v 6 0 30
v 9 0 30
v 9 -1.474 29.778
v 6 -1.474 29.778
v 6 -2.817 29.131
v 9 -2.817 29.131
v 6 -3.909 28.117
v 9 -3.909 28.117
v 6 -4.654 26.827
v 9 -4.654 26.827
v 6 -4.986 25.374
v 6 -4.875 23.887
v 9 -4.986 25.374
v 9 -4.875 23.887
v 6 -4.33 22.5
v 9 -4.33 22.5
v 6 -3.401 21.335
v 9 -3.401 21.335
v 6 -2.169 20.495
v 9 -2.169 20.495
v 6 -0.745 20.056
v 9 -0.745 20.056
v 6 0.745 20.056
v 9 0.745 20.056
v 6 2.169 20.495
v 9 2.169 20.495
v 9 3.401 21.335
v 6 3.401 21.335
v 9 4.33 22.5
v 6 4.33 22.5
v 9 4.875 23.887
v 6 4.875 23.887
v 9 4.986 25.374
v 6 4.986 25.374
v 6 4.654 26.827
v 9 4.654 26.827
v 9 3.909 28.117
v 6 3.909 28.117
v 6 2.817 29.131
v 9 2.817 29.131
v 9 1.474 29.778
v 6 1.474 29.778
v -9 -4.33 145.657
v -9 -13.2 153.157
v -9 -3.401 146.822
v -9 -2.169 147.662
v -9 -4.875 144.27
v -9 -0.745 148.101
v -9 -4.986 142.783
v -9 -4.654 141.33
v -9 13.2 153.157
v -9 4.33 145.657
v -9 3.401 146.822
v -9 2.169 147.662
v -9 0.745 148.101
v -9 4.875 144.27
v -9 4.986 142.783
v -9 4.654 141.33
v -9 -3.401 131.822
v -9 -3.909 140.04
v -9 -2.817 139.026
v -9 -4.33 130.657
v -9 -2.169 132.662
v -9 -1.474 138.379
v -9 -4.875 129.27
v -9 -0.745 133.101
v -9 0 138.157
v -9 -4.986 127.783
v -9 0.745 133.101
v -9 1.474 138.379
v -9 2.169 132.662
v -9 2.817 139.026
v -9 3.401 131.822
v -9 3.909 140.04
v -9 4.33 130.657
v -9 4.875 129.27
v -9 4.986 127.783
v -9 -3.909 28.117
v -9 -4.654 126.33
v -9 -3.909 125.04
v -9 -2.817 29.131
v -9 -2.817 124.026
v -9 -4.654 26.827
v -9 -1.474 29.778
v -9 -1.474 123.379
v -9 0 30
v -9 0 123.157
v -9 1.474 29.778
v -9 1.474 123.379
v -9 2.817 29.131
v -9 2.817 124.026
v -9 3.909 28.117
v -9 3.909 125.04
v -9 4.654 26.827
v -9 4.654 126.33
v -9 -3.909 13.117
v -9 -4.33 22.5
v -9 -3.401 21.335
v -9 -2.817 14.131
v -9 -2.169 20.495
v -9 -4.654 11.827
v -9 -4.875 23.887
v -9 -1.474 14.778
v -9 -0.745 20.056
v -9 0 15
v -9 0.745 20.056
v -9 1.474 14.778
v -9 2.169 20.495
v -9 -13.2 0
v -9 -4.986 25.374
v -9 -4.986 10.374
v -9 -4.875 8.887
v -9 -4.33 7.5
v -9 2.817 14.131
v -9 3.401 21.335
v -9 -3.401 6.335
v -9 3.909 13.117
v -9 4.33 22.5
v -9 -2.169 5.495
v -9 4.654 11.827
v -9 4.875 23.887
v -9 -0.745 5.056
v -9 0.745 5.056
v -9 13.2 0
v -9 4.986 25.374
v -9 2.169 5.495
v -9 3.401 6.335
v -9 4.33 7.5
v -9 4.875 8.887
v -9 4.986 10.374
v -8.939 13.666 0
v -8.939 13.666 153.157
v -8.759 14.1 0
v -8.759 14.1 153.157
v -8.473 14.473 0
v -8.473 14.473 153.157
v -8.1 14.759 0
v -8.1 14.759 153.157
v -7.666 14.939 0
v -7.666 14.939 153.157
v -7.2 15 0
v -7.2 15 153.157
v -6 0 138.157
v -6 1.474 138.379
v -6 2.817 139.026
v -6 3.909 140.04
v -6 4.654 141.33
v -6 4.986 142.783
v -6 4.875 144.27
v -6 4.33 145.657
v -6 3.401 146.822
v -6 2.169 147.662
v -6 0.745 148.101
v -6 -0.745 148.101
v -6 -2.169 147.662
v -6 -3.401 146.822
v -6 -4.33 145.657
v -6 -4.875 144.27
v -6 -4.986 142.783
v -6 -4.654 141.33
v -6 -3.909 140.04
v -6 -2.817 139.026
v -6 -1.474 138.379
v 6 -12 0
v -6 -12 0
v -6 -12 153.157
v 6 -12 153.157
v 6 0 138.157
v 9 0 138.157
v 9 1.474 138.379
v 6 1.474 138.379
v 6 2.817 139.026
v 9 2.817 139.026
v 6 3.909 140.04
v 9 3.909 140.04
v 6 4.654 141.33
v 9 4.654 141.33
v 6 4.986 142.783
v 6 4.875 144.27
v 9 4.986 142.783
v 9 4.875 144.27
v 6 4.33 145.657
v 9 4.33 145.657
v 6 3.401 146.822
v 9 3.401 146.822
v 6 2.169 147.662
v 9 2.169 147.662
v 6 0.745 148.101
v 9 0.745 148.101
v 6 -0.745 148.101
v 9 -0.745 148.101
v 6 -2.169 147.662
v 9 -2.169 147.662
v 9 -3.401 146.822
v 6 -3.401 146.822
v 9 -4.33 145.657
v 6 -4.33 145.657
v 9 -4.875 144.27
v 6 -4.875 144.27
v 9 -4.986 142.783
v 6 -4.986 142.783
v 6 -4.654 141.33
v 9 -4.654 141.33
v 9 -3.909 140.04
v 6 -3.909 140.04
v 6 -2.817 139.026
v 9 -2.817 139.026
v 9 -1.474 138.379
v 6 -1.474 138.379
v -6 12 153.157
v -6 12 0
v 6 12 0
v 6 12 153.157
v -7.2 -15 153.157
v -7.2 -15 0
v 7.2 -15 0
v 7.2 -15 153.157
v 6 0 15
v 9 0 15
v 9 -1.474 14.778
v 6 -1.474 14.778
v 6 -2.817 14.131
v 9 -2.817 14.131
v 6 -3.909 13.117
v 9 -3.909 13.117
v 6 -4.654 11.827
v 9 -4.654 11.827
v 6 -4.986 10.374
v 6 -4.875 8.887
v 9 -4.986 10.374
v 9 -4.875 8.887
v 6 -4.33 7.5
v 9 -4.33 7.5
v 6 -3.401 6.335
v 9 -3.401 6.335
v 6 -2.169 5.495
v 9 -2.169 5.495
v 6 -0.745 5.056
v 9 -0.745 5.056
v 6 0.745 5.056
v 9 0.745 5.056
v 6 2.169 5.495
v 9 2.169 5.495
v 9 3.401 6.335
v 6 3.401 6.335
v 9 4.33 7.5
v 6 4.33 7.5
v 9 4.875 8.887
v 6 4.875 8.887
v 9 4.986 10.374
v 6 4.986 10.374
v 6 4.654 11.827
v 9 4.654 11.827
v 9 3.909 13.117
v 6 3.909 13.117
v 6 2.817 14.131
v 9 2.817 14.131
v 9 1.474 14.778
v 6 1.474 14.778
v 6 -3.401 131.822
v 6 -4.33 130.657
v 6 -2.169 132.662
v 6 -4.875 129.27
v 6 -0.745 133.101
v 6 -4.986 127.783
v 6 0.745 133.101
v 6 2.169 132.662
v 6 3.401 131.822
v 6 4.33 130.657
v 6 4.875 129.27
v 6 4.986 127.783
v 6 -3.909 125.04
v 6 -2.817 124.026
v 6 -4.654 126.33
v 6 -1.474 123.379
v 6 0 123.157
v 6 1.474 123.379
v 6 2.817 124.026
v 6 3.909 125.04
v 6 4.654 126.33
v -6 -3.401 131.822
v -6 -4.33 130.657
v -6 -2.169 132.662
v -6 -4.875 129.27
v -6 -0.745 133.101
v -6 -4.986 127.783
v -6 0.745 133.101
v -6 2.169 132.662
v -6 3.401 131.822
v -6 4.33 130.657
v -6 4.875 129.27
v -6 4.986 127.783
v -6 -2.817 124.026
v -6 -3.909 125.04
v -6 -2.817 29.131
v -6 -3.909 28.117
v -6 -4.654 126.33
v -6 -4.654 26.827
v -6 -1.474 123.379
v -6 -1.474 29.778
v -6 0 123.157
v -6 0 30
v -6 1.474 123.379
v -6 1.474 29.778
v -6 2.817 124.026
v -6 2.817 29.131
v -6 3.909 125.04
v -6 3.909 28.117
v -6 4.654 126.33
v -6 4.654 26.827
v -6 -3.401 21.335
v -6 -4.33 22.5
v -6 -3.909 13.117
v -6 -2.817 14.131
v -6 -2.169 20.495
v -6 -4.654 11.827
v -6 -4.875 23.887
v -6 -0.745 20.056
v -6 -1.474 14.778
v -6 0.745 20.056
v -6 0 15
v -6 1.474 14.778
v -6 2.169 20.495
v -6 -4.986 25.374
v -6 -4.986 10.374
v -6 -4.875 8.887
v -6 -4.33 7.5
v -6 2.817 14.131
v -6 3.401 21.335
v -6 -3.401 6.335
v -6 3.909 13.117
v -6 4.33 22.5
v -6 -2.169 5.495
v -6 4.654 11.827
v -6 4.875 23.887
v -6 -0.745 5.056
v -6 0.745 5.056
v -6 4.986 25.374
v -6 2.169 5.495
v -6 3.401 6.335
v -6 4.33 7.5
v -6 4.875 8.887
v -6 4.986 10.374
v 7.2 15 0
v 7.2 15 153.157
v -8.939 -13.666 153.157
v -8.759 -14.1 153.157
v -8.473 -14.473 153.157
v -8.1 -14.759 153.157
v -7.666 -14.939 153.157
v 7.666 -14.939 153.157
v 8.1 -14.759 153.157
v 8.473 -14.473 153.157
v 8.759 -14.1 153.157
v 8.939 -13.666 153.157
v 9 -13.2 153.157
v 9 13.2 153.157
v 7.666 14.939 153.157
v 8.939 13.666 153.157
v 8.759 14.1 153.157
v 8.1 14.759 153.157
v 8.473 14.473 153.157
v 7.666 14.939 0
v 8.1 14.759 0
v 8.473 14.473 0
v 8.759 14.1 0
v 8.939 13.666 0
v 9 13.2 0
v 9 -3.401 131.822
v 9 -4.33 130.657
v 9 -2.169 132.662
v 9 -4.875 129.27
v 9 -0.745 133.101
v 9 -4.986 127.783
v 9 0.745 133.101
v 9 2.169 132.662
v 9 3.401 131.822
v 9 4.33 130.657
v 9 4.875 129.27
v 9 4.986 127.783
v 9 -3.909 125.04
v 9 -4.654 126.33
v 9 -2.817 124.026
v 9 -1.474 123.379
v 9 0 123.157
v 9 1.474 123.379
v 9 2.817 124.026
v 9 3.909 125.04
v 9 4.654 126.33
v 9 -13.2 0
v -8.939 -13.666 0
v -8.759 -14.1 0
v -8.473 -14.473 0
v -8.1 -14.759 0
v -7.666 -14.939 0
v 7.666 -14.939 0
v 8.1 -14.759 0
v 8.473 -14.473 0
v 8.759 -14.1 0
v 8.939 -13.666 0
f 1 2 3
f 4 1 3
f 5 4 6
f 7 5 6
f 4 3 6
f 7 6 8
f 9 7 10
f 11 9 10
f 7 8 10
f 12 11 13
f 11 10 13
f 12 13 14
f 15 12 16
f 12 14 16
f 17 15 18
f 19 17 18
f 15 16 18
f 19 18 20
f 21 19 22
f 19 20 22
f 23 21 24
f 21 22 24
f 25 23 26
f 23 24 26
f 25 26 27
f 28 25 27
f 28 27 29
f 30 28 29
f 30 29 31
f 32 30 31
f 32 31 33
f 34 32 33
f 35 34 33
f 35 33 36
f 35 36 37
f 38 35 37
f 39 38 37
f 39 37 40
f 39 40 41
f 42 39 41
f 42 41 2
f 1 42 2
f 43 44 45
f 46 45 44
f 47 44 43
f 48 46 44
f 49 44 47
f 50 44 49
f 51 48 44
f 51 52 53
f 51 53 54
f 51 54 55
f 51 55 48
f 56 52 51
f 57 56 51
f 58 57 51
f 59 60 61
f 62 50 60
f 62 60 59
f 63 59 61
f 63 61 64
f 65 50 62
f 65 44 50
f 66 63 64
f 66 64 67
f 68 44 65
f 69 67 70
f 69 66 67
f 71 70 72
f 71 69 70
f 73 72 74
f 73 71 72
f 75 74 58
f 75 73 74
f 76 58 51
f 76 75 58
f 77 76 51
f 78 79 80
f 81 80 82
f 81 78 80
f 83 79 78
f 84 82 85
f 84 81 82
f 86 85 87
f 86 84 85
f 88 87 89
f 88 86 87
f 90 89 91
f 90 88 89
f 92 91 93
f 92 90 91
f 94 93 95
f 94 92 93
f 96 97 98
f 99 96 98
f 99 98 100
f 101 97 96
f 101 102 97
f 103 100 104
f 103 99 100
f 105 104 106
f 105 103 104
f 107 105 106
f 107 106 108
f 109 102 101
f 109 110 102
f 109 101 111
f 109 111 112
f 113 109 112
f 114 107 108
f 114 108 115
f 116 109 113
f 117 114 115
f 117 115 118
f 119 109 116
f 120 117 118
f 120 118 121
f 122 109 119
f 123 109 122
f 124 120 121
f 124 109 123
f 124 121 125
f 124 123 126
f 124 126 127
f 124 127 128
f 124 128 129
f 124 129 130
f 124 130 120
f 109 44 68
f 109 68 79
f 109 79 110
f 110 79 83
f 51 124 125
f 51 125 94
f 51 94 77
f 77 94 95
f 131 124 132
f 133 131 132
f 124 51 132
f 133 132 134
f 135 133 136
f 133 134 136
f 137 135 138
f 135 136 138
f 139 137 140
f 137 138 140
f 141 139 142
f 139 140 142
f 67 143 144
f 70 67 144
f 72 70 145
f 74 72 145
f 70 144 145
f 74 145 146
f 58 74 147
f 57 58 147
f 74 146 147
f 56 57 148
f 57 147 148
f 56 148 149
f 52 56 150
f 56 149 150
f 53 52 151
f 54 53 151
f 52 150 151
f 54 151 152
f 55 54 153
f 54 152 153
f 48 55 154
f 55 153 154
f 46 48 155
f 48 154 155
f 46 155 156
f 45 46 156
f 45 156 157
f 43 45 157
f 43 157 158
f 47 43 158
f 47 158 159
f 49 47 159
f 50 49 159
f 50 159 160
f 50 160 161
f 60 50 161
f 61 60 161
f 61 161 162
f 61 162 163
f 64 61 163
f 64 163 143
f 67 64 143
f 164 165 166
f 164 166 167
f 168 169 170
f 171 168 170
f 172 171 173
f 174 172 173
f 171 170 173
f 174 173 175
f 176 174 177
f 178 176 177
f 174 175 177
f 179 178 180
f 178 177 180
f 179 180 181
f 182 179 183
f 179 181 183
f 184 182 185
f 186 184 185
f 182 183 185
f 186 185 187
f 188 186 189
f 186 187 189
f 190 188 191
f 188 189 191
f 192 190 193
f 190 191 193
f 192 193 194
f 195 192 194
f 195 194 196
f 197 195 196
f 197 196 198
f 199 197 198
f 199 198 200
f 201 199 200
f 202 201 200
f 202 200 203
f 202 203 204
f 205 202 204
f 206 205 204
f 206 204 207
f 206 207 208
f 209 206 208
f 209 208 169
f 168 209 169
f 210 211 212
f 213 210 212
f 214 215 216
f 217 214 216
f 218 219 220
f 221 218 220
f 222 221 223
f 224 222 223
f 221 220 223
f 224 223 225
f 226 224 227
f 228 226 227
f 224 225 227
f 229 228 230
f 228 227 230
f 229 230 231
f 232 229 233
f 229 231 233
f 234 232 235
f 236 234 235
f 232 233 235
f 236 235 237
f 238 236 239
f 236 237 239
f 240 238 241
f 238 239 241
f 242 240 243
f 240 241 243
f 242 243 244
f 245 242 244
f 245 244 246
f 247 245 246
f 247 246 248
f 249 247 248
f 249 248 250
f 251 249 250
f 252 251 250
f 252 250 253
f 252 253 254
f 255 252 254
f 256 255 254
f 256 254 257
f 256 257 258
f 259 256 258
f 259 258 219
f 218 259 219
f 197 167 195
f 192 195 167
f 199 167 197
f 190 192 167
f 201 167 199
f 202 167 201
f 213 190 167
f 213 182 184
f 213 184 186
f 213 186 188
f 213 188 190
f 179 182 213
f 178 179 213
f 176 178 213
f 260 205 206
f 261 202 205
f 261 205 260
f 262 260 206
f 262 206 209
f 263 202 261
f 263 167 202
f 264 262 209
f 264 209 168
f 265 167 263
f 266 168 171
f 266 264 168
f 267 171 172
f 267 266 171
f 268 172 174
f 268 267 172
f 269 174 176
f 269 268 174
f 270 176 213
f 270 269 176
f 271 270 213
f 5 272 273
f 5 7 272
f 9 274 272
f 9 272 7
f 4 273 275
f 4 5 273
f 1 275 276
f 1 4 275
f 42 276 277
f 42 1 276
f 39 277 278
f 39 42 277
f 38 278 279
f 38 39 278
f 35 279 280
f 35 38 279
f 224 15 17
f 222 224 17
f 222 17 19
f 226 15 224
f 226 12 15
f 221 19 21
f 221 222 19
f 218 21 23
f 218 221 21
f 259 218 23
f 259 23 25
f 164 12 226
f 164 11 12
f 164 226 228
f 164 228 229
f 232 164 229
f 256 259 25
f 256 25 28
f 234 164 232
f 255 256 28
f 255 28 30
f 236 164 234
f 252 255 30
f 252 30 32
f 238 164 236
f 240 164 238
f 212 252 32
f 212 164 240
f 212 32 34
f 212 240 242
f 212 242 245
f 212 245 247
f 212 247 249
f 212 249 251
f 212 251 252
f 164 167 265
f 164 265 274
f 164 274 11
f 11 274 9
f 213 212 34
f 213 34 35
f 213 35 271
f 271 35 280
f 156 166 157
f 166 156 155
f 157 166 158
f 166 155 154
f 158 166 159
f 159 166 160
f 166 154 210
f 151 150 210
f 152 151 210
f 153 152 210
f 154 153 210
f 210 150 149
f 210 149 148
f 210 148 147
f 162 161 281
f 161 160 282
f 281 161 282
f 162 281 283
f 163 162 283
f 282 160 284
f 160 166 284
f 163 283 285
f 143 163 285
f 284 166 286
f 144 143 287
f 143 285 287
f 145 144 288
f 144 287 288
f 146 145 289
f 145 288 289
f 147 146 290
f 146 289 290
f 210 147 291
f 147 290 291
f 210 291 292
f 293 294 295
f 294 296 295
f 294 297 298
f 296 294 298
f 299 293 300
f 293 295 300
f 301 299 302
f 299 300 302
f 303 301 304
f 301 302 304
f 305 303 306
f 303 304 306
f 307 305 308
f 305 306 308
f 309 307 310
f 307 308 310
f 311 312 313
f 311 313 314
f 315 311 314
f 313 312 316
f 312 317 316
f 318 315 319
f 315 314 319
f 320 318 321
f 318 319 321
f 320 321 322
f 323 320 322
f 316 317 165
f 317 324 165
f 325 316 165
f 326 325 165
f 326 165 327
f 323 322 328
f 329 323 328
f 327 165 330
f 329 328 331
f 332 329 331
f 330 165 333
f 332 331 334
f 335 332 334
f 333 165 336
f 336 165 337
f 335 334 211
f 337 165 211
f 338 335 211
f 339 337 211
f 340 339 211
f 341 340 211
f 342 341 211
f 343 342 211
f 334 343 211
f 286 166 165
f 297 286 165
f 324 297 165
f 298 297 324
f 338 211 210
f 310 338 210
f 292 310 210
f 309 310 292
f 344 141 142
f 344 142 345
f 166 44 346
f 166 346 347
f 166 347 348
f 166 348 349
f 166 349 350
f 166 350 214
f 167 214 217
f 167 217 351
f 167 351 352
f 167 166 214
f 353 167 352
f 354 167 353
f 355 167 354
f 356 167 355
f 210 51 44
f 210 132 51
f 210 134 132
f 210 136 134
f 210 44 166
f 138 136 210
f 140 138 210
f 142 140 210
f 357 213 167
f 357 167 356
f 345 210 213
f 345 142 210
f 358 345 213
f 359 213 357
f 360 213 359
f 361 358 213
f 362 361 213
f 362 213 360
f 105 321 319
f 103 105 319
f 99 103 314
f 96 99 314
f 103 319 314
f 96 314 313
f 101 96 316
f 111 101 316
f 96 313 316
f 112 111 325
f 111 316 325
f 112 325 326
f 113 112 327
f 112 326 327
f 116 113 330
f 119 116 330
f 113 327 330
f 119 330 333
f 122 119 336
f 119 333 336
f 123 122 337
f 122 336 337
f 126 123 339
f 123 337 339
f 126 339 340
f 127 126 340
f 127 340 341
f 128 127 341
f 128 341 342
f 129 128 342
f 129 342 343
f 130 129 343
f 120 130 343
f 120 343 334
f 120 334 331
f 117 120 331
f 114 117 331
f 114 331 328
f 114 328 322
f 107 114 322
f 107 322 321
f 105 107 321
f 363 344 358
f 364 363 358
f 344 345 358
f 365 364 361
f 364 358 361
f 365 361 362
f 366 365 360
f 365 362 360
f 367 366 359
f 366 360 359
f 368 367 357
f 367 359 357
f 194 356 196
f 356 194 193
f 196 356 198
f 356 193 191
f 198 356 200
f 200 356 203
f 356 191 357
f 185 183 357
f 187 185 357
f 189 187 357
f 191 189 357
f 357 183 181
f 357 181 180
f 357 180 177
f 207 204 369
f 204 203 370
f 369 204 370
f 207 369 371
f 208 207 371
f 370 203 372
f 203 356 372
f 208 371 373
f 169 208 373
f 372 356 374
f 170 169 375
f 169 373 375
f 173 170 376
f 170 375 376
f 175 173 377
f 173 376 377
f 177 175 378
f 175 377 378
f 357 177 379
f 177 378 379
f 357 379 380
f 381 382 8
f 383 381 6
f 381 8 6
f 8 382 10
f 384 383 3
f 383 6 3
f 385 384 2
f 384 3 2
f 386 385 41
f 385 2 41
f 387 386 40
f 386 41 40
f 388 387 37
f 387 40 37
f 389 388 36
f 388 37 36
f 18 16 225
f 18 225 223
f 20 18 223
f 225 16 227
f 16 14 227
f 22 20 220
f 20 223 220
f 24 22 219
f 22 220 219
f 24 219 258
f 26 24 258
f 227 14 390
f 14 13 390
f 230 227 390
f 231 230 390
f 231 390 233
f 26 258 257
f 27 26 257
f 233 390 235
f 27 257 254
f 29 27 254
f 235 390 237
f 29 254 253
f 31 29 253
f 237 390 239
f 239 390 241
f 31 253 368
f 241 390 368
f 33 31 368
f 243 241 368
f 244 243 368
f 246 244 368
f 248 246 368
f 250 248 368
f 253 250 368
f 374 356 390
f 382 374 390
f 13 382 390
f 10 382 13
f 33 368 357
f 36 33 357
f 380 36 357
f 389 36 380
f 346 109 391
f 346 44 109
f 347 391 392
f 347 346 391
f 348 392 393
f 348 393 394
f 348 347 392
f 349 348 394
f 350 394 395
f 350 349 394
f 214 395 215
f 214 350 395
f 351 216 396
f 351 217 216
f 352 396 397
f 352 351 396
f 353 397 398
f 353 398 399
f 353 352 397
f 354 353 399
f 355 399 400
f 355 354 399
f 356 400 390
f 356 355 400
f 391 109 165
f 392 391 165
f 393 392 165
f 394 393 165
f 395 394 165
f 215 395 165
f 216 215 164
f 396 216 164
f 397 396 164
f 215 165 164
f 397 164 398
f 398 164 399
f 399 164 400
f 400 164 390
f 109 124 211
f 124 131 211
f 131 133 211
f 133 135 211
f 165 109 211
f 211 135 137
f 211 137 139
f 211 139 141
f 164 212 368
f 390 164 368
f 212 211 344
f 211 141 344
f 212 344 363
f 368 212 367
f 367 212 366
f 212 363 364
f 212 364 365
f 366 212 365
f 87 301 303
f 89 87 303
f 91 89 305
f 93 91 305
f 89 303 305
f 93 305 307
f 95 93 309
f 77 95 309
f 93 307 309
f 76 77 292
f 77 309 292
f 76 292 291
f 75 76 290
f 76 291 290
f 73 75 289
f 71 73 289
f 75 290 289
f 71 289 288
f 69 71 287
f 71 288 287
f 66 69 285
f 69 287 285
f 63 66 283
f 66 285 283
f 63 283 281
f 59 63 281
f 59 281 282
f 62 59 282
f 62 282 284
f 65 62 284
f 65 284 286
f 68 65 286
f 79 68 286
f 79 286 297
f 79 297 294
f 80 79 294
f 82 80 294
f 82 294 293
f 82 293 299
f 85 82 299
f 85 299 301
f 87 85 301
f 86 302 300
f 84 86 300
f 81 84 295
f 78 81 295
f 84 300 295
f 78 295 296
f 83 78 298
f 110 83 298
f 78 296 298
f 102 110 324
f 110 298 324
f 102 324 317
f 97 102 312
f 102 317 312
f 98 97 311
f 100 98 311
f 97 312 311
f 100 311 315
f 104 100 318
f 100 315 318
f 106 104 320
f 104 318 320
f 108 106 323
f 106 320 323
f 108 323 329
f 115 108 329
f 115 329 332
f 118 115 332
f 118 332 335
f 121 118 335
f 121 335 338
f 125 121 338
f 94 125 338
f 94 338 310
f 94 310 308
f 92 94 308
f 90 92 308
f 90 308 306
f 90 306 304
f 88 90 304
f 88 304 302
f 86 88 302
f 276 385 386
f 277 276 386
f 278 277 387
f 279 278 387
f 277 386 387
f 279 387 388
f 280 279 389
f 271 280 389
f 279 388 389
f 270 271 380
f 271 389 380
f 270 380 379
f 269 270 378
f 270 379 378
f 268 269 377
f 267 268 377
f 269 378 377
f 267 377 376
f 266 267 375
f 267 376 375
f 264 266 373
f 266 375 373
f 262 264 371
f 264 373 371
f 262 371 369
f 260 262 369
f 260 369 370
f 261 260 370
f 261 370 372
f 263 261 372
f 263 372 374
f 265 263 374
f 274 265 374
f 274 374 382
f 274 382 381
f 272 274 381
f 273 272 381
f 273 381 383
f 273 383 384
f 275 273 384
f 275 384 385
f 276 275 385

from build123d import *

# Parameters (mm, degrees)
SKETCH1_W         = 18
SKETCH1_H         = 30
SKETCH1_W_2       = 12
SKETCH1_H_2       = 24
BODY_DEPTH        = 153.15701543
SKETCH2_R         = 5
MOUNT_HOLES_DEPTH = 155.938927889
CORNER_FILLETS_R  = 1.8


with BuildPart() as part:
    # Sketch1 → Body (new body)
    with BuildSketch(Plane.XY):
        Rectangle(SKETCH1_W, SKETCH1_H)
        Rectangle(SKETCH1_W_2, SKETCH1_H_2, mode=Mode.SUBTRACT)
    extrude(amount=BODY_DEPTH)

    # Sketch2 → Mount Holes (cut, through all)
    with BuildSketch(Plane(origin=(9, 0, 0), x_dir=(0, 0, -1), z_dir=(1, 0, 0))):
        with Locations((-143.15701543, 0)):
            Circle(SKETCH2_R)
        with Locations((-128.15701543, 0)):
            Circle(SKETCH2_R)
        with Locations(Location((-25, 0, 0), (0, 0, 180))):
            Circle(SKETCH2_R)
        with Locations(Location((-10, 0, 0), (0, 0, 180))):
            Circle(SKETCH2_R)
    extrude(amount=-MOUNT_HOLES_DEPTH, mode=Mode.SUBTRACT)

    # Corner Fillets
    corner_fillets_edges = [part.edges().sort_by_distance(p)[0] for p in [
        (-9, 15, 76.578507715),
        (9, 15, 76.578507715),
        (9, -15, 76.578507715),
        (-9, -15, 76.578507715),
    ]]
    fillet(corner_fillets_edges, radius=CORNER_FILLETS_R)


solid = part.part
